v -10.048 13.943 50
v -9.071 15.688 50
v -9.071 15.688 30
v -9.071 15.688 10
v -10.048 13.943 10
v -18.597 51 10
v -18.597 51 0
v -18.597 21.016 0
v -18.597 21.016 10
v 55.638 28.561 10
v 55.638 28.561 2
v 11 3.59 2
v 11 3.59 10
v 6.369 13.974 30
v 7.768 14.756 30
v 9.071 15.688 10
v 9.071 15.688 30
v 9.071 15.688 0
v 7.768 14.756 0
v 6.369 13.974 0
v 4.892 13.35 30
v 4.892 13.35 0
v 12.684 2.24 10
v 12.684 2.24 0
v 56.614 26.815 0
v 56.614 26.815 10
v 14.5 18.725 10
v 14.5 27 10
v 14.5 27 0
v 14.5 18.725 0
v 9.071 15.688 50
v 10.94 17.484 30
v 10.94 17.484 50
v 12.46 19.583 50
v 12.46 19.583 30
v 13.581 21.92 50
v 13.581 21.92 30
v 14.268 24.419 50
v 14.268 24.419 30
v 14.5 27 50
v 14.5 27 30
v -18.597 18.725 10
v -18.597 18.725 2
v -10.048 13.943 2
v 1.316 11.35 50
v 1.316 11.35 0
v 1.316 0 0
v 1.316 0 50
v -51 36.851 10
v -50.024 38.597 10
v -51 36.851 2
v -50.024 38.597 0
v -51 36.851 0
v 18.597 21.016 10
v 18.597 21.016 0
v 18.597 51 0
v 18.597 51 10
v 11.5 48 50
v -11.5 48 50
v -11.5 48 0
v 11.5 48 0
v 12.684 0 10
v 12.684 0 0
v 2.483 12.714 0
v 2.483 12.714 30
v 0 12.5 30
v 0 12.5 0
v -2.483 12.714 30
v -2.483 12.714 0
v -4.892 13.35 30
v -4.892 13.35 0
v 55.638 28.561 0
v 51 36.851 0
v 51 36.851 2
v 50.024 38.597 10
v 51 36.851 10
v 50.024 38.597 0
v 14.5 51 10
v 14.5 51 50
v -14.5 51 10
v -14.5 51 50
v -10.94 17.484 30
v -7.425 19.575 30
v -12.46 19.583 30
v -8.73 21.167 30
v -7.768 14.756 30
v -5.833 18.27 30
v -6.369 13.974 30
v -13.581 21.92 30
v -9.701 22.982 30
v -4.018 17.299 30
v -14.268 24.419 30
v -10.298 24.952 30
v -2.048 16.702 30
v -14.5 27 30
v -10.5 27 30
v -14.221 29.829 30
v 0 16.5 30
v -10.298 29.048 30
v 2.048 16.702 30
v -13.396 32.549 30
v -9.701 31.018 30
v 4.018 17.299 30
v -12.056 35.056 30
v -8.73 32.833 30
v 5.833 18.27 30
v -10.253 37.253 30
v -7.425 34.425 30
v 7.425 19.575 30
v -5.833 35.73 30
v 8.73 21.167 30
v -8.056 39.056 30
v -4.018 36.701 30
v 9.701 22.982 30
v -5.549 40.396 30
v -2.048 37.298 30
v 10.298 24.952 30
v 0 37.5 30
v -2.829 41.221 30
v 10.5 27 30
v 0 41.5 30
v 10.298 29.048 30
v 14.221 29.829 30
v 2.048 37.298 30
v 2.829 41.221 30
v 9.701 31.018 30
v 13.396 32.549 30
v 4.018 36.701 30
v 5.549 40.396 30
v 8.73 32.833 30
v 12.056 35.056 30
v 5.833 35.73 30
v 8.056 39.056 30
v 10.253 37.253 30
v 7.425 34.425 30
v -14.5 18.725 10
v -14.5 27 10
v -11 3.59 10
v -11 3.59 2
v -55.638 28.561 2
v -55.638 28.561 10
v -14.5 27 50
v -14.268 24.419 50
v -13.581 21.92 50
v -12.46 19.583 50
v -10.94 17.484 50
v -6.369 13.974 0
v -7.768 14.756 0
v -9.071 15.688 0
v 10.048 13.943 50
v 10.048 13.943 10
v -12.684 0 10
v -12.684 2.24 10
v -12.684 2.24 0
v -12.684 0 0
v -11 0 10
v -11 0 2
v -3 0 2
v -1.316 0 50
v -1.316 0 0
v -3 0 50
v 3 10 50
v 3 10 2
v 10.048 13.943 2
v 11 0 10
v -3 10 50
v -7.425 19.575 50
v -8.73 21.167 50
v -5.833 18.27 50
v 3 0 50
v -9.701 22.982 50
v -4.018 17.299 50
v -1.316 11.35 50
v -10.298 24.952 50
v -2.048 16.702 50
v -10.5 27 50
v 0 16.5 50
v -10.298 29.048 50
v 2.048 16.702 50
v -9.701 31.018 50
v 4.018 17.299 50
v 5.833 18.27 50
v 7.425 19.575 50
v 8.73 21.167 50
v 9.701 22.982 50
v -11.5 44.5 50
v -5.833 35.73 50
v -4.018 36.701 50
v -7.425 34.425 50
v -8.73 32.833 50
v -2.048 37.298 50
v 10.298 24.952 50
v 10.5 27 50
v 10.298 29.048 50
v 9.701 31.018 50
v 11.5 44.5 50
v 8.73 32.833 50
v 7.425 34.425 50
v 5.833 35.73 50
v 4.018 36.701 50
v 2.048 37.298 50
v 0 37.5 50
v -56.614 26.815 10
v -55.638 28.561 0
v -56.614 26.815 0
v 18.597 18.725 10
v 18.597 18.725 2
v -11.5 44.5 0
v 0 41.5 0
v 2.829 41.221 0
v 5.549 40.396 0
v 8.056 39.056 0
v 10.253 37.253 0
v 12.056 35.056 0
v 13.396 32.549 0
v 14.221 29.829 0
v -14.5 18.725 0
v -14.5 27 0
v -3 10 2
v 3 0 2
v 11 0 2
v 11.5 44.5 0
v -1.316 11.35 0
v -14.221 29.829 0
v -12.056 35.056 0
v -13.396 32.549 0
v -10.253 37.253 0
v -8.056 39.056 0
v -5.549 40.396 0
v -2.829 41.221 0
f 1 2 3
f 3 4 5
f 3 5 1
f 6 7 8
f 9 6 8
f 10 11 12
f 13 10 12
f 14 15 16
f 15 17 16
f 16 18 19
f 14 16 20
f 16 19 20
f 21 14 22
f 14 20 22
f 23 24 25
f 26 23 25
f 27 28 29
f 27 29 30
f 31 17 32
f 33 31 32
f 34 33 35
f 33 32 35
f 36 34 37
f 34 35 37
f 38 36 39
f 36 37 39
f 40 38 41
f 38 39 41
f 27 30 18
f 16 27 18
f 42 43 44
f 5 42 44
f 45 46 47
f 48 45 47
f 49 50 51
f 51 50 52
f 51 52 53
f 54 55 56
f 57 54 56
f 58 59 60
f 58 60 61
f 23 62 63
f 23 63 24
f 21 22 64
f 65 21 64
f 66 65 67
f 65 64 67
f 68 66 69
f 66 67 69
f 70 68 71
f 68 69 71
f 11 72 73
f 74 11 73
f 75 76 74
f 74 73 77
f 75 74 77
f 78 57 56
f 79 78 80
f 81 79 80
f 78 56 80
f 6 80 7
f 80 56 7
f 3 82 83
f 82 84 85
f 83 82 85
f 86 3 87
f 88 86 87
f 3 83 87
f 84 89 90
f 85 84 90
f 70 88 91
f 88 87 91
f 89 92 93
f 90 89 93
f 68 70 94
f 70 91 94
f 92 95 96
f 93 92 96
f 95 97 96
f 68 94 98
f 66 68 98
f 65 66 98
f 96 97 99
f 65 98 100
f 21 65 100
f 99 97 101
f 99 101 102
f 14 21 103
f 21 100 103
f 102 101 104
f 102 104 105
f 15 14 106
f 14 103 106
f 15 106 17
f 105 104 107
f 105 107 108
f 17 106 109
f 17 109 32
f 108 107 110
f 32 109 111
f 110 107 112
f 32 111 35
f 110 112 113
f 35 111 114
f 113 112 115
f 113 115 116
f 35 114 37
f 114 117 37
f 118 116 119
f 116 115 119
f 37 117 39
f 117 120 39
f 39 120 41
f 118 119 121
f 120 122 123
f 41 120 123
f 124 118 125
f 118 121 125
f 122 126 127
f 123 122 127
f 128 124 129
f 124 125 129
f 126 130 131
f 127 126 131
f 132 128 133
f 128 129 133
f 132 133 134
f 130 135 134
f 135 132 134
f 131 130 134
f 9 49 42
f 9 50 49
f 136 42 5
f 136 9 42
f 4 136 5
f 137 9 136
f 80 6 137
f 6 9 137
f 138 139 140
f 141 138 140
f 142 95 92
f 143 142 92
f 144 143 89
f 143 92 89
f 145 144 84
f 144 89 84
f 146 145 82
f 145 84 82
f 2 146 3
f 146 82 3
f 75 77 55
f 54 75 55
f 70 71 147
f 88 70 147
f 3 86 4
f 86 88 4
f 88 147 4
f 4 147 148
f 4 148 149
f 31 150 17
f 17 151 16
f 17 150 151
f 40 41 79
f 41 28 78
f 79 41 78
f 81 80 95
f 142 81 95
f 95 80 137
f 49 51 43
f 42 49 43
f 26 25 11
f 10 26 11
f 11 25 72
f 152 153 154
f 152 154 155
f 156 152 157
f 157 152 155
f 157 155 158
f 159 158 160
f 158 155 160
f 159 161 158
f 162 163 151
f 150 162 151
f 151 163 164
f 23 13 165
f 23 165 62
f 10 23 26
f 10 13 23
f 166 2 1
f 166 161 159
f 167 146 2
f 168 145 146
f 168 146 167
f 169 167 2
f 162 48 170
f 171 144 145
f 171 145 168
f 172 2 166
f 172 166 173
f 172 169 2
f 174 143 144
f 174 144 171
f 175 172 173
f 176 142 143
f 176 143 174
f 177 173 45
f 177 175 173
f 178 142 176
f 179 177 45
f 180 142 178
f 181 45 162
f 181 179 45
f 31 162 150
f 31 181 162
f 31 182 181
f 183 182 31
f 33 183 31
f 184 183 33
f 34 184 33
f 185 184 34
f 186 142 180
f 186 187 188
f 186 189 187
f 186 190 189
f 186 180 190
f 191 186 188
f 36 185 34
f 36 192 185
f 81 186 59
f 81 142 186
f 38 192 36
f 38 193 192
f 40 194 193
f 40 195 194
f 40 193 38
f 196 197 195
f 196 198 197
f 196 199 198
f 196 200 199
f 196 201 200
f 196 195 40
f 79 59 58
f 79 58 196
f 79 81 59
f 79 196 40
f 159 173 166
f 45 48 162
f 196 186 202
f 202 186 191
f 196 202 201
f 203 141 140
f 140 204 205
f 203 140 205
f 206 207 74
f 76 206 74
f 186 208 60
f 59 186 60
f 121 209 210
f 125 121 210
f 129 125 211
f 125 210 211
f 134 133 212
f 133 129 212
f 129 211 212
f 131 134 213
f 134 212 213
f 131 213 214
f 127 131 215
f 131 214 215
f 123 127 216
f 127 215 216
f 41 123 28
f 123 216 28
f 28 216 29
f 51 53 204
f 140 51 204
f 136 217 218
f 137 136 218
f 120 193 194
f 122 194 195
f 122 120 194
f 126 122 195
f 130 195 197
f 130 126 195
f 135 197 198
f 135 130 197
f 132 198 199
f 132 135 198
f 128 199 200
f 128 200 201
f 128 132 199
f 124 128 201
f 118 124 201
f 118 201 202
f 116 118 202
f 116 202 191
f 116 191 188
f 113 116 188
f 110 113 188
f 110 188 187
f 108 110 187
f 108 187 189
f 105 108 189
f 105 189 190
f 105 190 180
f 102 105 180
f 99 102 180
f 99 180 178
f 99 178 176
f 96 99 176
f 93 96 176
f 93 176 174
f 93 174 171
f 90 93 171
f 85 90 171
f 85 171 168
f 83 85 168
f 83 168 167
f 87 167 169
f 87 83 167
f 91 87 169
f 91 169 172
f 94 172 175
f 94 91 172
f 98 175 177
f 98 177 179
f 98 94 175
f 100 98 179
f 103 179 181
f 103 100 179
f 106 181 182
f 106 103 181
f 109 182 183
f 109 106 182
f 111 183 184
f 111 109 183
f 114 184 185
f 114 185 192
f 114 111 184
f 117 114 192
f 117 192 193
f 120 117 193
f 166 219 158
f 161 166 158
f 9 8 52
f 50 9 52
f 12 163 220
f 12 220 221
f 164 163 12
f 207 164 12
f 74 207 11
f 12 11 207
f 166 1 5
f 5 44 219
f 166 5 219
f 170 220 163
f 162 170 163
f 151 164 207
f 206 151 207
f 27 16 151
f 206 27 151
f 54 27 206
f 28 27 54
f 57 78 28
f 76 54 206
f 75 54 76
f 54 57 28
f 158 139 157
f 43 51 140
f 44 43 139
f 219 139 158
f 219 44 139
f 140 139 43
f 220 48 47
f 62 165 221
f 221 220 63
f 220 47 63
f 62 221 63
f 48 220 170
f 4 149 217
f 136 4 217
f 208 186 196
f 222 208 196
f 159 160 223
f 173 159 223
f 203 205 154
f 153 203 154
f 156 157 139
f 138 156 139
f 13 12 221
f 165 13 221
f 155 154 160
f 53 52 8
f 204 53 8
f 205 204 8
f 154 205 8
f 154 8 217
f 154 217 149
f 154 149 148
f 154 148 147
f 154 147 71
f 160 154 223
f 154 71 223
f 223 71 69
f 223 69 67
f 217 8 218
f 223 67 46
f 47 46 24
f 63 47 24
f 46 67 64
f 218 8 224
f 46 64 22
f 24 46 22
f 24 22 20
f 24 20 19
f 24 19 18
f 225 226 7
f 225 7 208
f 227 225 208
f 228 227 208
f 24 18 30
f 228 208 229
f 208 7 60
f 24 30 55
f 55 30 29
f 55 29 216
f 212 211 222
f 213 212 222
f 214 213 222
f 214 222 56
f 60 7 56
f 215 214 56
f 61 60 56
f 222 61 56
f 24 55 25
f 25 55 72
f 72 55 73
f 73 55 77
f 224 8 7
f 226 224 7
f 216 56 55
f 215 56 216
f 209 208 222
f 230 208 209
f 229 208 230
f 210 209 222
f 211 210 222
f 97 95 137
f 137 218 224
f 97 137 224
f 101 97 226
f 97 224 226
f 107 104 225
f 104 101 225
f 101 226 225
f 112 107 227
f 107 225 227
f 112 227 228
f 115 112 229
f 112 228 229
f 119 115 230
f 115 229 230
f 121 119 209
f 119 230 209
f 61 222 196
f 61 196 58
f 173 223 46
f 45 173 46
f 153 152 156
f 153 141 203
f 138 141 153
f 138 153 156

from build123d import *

# Parameters (mm, degrees)
F1_DEPTH = 10
F2_DEPTH = 2
F0_R     = 10.5
F3_DEPTH = 50
F4_DEPTH = 30
F0_W     = 23
F0_H     = 3.5
F5_DEPTH = 50


with BuildPart() as f1:
    # F0 (on Top) → F1 (new body)
    with BuildSketch(Plane.XY):
        Polygon((-12.6842105263, 0), (-11, 0), (-11, 3.5898238607), (-55.6379765465, 28.5605340733), (-56.6143926616, 26.8150795278), (-12.6842105263, 2.2403130945), align=None)
    extrude(amount=F1_DEPTH)



with BuildPart() as f1b:
    # F0 (on Top) → F1, piece 2 (new body)
    with BuildSketch(Plane.XY):
        Polygon((-51, 36.8514431642), (-18.596614075, 18.7248249248), (-18.596614075, 21.0164915914), (-50.0235838849, 38.5968977096), align=None)
        Polygon((-18.596614075, 21.0164915914), (-18.596614075, 18.7248249248), (-14.5, 18.7248249248), align=None)
        Polygon((-18.596614075, 21.0164915914), (-14.5, 18.7248249248), (-14.5, 27), (-14.5, 41.5), (-14.5, 51), (-18.596614075, 51), align=None)
        Polygon((-18.596614075, 18.7248249248), (-10.0476759502, 13.9425056295), (-9.0712598352, 15.687960175), (-14.5, 18.7248249248), align=None)
    extrude(amount=F1_DEPTH)


with BuildPart() as f1c:
    # F0 (on Top) → F1, piece 3 (new body)
    with BuildSketch(Plane.XY):
        Polygon((18.596614075, 21.0164915914), (14.5, 18.7248249248), (18.596614075, 18.7248249248), align=None)
        Polygon((18.596614075, 21.0164915914), (18.596614075, 18.7248249248), (51, 36.8514431642), (50.0235838849, 38.5968977096), align=None)
        Polygon((14.5, 51), (14.5, 41.5), (14.5, 27), (14.5, 18.7248249248), (18.596614075, 21.0164915914), (18.596614075, 51), align=None)
        Polygon((14.5, 18.7248249248), (9.0712598352, 15.687960175), (10.0476759502, 13.9425056295), (18.596614075, 18.7248249248), align=None)
    extrude(amount=F1_DEPTH)



with BuildPart() as f1d:
    # F0 (on Top) → F1, piece 4 (new body)
    with BuildSketch(Plane.XY):
        Polygon((55.6379765465, 28.5605340733), (11, 3.5898238607), (12.6842105263, 2.2403130945), (56.6143926616, 26.8150795278), align=None)
        Polygon((11, 3.5898238607), (11, 0), (12.6842105263, 0), (12.6842105263, 2.2403130945), align=None)
    extrude(amount=F1_DEPTH)


with BuildPart() as f1_1:
    add(f1.part)

    add(f1b.part)  # F2 merges F1b
    # F0 (on Top) → F2 (join)
    with BuildSketch(Plane.XY):
        Polygon((-11, 0), (-3, 0), (-3, 10), (-10.0476759502, 13.9425056295), (-18.596614075, 18.7248249248), (-51, 36.8514431642), (-55.6379765465, 28.5605340733), (-11, 3.5898238607), align=None)
    extrude(amount=F2_DEPTH)



with BuildPart() as f1c_1:
    add(f1c.part)

    add(f1d.part)  # F2#2 merges F1d
    # F0 (on Top) → F2, piece 2 (join)
    with BuildSketch(Plane.XY):
        Polygon((10.0476759502, 13.9425056295), (3, 10), (11, 3.5898238607), (55.6379765465, 28.5605340733), (51, 36.8514431642), (18.596614075, 18.7248249248), align=None)
        Polygon((3, 10), (3, 0), (11, 0), (11, 3.5898238607), align=None)
    extrude(amount=F2_DEPTH)


with BuildPart() as f1_2:
    add(f1_1.part)

    add(f1c_1.part)  # F3 merges F1c
    # F0 (on Top) → F3 (join)
    with BuildSketch(Plane.XY):
        with BuildLine():
            ThreePointArc((-14.5, 27), (-13.0725526889, 20.7263753543), (-9.0712598352, 15.687960175))
            Line((-9.0712598352, 15.687960175), (-4.8924551228, 13.3503156494))
            ThreePointArc((-4.8924551228, 13.3503156494), (0, 12.5), (4.8924551228, 13.3503156494))
            Line((4.8924551228, 13.3503156494), (9.0712598352, 15.687960175))
            ThreePointArc((9.0712598352, 15.687960175), (13.0725526889, 20.7263753543), (14.5, 27))
            ThreePointArc((14.5, 27), (10.2530483272, 37.2530483272), (0, 41.5))
            ThreePointArc((0, 41.5), (-10.2530483272, 37.2530483272), (-14.5, 27))
        make_face()
        with Locations((0, 27)):
            Circle(F0_R, mode=Mode.SUBTRACT)
        with BuildLine():
            Line((-4.8924551228, 13.3503156494), (-9.0712598352, 15.687960175))
            ThreePointArc((-9.0712598352, 15.687960175), (-7.0790168342, 14.3454545455), (-4.8924551228, 13.3503156494))
        make_face()
        with BuildLine():
            Line((9.0712598352, 15.687960175), (4.8924551228, 13.3503156494))
            ThreePointArc((4.8924551228, 13.3503156494), (7.0790168342, 14.3454545455), (9.0712598352, 15.687960175))
        make_face()
    extrude(amount=F3_DEPTH)

    # F0 (on Top) → F4 (cut)
    with BuildSketch(Plane.XY):
        with BuildLine():
            ThreePointArc((-14.5, 27), (-13.0725526889, 20.7263753543), (-9.0712598352, 15.687960175))
            Line((-9.0712598352, 15.687960175), (-4.8924551228, 13.3503156494))
            ThreePointArc((-4.8924551228, 13.3503156494), (0, 12.5), (4.8924551228, 13.3503156494))
            Line((4.8924551228, 13.3503156494), (9.0712598352, 15.687960175))
            ThreePointArc((9.0712598352, 15.687960175), (13.0725526889, 20.7263753543), (14.5, 27))
            ThreePointArc((14.5, 27), (10.2530483272, 37.2530483272), (0, 41.5))
            ThreePointArc((0, 41.5), (-10.2530483272, 37.2530483272), (-14.5, 27))
        make_face()
        with Locations((0, 27)):
            Circle(F0_R, mode=Mode.SUBTRACT)
        with BuildLine():
            Line((-4.8924551228, 13.3503156494), (-9.0712598352, 15.687960175))
            ThreePointArc((-9.0712598352, 15.687960175), (-7.0790168342, 14.3454545455), (-4.8924551228, 13.3503156494))
        make_face()
        with BuildLine():
            Line((9.0712598352, 15.687960175), (4.8924551228, 13.3503156494))
            ThreePointArc((4.8924551228, 13.3503156494), (7.0790168342, 14.3454545455), (9.0712598352, 15.687960175))
        make_face()
    extrude(amount=F4_DEPTH, mode=Mode.SUBTRACT)

    # F0 (on Top) → F5 (join)
    with BuildSketch(Plane.XY):
        with BuildLine():
            Line((-14.5, 41.5), (-14.5, 27))
            ThreePointArc((-14.5, 27), (-10.2530483272, 37.2530483272), (0, 41.5))
            Line((0, 41.5), (-14.5, 41.5))
        make_face()
        with BuildLine():
            Line((14.5, 41.5), (0, 41.5))
            ThreePointArc((0, 41.5), (10.2530483272, 37.2530483272), (14.5, 27))
            Line((14.5, 27), (14.5, 41.5))
        make_face()
        with BuildLine():
            Line((-4.8924551228, 13.3503156494), (-1.3157894737, 11.3495107662))
            Line((-1.3157894737, 11.3495107662), (1.3157894737, 11.3495107662))
            Line((1.3157894737, 11.3495107662), (4.8924551228, 13.3503156494))
            ThreePointArc((4.8924551228, 13.3503156494), (0, 12.5), (-4.8924551228, 13.3503156494))
        make_face()
        Polygon((-14.5, 41.5), (0, 41.5), (14.5, 41.5), (14.5, 51), (-14.5, 51), align=None)
        with Locations((0, 46.25)):
            Rectangle(F0_W, F0_H, mode=Mode.SUBTRACT)
        with BuildLine():
            Line((1.3157894737, 11.3495107662), (1.3157894737, 0))
            Line((1.3157894737, 0), (3, 0))
            Line((3, 0), (3, 10))
            Line((3, 10), (10.0476759502, 13.9425056295))
            Line((10.0476759502, 13.9425056295), (9.0712598352, 15.687960175))
            ThreePointArc((9.0712598352, 15.687960175), (7.0790168342, 14.3454545455), (4.8924551228, 13.3503156494))
            Line((4.8924551228, 13.3503156494), (1.3157894737, 11.3495107662))
        make_face()
        with BuildLine():
            Line((-3, 10), (-3, 0))
            Line((-3, 0), (-1.3157894737, 0))
            Line((-1.3157894737, 0), (-1.3157894737, 11.3495107662))
            Line((-1.3157894737, 11.3495107662), (-4.8924551228, 13.3503156494))
            ThreePointArc((-4.8924551228, 13.3503156494), (-7.0790168342, 14.3454545455), (-9.0712598352, 15.687960175))
            Line((-9.0712598352, 15.687960175), (-10.0476759502, 13.9425056295))
            Line((-10.0476759502, 13.9425056295), (-3, 10))
        make_face()
    extrude(amount=F5_DEPTH)


solid = f1_2.part
